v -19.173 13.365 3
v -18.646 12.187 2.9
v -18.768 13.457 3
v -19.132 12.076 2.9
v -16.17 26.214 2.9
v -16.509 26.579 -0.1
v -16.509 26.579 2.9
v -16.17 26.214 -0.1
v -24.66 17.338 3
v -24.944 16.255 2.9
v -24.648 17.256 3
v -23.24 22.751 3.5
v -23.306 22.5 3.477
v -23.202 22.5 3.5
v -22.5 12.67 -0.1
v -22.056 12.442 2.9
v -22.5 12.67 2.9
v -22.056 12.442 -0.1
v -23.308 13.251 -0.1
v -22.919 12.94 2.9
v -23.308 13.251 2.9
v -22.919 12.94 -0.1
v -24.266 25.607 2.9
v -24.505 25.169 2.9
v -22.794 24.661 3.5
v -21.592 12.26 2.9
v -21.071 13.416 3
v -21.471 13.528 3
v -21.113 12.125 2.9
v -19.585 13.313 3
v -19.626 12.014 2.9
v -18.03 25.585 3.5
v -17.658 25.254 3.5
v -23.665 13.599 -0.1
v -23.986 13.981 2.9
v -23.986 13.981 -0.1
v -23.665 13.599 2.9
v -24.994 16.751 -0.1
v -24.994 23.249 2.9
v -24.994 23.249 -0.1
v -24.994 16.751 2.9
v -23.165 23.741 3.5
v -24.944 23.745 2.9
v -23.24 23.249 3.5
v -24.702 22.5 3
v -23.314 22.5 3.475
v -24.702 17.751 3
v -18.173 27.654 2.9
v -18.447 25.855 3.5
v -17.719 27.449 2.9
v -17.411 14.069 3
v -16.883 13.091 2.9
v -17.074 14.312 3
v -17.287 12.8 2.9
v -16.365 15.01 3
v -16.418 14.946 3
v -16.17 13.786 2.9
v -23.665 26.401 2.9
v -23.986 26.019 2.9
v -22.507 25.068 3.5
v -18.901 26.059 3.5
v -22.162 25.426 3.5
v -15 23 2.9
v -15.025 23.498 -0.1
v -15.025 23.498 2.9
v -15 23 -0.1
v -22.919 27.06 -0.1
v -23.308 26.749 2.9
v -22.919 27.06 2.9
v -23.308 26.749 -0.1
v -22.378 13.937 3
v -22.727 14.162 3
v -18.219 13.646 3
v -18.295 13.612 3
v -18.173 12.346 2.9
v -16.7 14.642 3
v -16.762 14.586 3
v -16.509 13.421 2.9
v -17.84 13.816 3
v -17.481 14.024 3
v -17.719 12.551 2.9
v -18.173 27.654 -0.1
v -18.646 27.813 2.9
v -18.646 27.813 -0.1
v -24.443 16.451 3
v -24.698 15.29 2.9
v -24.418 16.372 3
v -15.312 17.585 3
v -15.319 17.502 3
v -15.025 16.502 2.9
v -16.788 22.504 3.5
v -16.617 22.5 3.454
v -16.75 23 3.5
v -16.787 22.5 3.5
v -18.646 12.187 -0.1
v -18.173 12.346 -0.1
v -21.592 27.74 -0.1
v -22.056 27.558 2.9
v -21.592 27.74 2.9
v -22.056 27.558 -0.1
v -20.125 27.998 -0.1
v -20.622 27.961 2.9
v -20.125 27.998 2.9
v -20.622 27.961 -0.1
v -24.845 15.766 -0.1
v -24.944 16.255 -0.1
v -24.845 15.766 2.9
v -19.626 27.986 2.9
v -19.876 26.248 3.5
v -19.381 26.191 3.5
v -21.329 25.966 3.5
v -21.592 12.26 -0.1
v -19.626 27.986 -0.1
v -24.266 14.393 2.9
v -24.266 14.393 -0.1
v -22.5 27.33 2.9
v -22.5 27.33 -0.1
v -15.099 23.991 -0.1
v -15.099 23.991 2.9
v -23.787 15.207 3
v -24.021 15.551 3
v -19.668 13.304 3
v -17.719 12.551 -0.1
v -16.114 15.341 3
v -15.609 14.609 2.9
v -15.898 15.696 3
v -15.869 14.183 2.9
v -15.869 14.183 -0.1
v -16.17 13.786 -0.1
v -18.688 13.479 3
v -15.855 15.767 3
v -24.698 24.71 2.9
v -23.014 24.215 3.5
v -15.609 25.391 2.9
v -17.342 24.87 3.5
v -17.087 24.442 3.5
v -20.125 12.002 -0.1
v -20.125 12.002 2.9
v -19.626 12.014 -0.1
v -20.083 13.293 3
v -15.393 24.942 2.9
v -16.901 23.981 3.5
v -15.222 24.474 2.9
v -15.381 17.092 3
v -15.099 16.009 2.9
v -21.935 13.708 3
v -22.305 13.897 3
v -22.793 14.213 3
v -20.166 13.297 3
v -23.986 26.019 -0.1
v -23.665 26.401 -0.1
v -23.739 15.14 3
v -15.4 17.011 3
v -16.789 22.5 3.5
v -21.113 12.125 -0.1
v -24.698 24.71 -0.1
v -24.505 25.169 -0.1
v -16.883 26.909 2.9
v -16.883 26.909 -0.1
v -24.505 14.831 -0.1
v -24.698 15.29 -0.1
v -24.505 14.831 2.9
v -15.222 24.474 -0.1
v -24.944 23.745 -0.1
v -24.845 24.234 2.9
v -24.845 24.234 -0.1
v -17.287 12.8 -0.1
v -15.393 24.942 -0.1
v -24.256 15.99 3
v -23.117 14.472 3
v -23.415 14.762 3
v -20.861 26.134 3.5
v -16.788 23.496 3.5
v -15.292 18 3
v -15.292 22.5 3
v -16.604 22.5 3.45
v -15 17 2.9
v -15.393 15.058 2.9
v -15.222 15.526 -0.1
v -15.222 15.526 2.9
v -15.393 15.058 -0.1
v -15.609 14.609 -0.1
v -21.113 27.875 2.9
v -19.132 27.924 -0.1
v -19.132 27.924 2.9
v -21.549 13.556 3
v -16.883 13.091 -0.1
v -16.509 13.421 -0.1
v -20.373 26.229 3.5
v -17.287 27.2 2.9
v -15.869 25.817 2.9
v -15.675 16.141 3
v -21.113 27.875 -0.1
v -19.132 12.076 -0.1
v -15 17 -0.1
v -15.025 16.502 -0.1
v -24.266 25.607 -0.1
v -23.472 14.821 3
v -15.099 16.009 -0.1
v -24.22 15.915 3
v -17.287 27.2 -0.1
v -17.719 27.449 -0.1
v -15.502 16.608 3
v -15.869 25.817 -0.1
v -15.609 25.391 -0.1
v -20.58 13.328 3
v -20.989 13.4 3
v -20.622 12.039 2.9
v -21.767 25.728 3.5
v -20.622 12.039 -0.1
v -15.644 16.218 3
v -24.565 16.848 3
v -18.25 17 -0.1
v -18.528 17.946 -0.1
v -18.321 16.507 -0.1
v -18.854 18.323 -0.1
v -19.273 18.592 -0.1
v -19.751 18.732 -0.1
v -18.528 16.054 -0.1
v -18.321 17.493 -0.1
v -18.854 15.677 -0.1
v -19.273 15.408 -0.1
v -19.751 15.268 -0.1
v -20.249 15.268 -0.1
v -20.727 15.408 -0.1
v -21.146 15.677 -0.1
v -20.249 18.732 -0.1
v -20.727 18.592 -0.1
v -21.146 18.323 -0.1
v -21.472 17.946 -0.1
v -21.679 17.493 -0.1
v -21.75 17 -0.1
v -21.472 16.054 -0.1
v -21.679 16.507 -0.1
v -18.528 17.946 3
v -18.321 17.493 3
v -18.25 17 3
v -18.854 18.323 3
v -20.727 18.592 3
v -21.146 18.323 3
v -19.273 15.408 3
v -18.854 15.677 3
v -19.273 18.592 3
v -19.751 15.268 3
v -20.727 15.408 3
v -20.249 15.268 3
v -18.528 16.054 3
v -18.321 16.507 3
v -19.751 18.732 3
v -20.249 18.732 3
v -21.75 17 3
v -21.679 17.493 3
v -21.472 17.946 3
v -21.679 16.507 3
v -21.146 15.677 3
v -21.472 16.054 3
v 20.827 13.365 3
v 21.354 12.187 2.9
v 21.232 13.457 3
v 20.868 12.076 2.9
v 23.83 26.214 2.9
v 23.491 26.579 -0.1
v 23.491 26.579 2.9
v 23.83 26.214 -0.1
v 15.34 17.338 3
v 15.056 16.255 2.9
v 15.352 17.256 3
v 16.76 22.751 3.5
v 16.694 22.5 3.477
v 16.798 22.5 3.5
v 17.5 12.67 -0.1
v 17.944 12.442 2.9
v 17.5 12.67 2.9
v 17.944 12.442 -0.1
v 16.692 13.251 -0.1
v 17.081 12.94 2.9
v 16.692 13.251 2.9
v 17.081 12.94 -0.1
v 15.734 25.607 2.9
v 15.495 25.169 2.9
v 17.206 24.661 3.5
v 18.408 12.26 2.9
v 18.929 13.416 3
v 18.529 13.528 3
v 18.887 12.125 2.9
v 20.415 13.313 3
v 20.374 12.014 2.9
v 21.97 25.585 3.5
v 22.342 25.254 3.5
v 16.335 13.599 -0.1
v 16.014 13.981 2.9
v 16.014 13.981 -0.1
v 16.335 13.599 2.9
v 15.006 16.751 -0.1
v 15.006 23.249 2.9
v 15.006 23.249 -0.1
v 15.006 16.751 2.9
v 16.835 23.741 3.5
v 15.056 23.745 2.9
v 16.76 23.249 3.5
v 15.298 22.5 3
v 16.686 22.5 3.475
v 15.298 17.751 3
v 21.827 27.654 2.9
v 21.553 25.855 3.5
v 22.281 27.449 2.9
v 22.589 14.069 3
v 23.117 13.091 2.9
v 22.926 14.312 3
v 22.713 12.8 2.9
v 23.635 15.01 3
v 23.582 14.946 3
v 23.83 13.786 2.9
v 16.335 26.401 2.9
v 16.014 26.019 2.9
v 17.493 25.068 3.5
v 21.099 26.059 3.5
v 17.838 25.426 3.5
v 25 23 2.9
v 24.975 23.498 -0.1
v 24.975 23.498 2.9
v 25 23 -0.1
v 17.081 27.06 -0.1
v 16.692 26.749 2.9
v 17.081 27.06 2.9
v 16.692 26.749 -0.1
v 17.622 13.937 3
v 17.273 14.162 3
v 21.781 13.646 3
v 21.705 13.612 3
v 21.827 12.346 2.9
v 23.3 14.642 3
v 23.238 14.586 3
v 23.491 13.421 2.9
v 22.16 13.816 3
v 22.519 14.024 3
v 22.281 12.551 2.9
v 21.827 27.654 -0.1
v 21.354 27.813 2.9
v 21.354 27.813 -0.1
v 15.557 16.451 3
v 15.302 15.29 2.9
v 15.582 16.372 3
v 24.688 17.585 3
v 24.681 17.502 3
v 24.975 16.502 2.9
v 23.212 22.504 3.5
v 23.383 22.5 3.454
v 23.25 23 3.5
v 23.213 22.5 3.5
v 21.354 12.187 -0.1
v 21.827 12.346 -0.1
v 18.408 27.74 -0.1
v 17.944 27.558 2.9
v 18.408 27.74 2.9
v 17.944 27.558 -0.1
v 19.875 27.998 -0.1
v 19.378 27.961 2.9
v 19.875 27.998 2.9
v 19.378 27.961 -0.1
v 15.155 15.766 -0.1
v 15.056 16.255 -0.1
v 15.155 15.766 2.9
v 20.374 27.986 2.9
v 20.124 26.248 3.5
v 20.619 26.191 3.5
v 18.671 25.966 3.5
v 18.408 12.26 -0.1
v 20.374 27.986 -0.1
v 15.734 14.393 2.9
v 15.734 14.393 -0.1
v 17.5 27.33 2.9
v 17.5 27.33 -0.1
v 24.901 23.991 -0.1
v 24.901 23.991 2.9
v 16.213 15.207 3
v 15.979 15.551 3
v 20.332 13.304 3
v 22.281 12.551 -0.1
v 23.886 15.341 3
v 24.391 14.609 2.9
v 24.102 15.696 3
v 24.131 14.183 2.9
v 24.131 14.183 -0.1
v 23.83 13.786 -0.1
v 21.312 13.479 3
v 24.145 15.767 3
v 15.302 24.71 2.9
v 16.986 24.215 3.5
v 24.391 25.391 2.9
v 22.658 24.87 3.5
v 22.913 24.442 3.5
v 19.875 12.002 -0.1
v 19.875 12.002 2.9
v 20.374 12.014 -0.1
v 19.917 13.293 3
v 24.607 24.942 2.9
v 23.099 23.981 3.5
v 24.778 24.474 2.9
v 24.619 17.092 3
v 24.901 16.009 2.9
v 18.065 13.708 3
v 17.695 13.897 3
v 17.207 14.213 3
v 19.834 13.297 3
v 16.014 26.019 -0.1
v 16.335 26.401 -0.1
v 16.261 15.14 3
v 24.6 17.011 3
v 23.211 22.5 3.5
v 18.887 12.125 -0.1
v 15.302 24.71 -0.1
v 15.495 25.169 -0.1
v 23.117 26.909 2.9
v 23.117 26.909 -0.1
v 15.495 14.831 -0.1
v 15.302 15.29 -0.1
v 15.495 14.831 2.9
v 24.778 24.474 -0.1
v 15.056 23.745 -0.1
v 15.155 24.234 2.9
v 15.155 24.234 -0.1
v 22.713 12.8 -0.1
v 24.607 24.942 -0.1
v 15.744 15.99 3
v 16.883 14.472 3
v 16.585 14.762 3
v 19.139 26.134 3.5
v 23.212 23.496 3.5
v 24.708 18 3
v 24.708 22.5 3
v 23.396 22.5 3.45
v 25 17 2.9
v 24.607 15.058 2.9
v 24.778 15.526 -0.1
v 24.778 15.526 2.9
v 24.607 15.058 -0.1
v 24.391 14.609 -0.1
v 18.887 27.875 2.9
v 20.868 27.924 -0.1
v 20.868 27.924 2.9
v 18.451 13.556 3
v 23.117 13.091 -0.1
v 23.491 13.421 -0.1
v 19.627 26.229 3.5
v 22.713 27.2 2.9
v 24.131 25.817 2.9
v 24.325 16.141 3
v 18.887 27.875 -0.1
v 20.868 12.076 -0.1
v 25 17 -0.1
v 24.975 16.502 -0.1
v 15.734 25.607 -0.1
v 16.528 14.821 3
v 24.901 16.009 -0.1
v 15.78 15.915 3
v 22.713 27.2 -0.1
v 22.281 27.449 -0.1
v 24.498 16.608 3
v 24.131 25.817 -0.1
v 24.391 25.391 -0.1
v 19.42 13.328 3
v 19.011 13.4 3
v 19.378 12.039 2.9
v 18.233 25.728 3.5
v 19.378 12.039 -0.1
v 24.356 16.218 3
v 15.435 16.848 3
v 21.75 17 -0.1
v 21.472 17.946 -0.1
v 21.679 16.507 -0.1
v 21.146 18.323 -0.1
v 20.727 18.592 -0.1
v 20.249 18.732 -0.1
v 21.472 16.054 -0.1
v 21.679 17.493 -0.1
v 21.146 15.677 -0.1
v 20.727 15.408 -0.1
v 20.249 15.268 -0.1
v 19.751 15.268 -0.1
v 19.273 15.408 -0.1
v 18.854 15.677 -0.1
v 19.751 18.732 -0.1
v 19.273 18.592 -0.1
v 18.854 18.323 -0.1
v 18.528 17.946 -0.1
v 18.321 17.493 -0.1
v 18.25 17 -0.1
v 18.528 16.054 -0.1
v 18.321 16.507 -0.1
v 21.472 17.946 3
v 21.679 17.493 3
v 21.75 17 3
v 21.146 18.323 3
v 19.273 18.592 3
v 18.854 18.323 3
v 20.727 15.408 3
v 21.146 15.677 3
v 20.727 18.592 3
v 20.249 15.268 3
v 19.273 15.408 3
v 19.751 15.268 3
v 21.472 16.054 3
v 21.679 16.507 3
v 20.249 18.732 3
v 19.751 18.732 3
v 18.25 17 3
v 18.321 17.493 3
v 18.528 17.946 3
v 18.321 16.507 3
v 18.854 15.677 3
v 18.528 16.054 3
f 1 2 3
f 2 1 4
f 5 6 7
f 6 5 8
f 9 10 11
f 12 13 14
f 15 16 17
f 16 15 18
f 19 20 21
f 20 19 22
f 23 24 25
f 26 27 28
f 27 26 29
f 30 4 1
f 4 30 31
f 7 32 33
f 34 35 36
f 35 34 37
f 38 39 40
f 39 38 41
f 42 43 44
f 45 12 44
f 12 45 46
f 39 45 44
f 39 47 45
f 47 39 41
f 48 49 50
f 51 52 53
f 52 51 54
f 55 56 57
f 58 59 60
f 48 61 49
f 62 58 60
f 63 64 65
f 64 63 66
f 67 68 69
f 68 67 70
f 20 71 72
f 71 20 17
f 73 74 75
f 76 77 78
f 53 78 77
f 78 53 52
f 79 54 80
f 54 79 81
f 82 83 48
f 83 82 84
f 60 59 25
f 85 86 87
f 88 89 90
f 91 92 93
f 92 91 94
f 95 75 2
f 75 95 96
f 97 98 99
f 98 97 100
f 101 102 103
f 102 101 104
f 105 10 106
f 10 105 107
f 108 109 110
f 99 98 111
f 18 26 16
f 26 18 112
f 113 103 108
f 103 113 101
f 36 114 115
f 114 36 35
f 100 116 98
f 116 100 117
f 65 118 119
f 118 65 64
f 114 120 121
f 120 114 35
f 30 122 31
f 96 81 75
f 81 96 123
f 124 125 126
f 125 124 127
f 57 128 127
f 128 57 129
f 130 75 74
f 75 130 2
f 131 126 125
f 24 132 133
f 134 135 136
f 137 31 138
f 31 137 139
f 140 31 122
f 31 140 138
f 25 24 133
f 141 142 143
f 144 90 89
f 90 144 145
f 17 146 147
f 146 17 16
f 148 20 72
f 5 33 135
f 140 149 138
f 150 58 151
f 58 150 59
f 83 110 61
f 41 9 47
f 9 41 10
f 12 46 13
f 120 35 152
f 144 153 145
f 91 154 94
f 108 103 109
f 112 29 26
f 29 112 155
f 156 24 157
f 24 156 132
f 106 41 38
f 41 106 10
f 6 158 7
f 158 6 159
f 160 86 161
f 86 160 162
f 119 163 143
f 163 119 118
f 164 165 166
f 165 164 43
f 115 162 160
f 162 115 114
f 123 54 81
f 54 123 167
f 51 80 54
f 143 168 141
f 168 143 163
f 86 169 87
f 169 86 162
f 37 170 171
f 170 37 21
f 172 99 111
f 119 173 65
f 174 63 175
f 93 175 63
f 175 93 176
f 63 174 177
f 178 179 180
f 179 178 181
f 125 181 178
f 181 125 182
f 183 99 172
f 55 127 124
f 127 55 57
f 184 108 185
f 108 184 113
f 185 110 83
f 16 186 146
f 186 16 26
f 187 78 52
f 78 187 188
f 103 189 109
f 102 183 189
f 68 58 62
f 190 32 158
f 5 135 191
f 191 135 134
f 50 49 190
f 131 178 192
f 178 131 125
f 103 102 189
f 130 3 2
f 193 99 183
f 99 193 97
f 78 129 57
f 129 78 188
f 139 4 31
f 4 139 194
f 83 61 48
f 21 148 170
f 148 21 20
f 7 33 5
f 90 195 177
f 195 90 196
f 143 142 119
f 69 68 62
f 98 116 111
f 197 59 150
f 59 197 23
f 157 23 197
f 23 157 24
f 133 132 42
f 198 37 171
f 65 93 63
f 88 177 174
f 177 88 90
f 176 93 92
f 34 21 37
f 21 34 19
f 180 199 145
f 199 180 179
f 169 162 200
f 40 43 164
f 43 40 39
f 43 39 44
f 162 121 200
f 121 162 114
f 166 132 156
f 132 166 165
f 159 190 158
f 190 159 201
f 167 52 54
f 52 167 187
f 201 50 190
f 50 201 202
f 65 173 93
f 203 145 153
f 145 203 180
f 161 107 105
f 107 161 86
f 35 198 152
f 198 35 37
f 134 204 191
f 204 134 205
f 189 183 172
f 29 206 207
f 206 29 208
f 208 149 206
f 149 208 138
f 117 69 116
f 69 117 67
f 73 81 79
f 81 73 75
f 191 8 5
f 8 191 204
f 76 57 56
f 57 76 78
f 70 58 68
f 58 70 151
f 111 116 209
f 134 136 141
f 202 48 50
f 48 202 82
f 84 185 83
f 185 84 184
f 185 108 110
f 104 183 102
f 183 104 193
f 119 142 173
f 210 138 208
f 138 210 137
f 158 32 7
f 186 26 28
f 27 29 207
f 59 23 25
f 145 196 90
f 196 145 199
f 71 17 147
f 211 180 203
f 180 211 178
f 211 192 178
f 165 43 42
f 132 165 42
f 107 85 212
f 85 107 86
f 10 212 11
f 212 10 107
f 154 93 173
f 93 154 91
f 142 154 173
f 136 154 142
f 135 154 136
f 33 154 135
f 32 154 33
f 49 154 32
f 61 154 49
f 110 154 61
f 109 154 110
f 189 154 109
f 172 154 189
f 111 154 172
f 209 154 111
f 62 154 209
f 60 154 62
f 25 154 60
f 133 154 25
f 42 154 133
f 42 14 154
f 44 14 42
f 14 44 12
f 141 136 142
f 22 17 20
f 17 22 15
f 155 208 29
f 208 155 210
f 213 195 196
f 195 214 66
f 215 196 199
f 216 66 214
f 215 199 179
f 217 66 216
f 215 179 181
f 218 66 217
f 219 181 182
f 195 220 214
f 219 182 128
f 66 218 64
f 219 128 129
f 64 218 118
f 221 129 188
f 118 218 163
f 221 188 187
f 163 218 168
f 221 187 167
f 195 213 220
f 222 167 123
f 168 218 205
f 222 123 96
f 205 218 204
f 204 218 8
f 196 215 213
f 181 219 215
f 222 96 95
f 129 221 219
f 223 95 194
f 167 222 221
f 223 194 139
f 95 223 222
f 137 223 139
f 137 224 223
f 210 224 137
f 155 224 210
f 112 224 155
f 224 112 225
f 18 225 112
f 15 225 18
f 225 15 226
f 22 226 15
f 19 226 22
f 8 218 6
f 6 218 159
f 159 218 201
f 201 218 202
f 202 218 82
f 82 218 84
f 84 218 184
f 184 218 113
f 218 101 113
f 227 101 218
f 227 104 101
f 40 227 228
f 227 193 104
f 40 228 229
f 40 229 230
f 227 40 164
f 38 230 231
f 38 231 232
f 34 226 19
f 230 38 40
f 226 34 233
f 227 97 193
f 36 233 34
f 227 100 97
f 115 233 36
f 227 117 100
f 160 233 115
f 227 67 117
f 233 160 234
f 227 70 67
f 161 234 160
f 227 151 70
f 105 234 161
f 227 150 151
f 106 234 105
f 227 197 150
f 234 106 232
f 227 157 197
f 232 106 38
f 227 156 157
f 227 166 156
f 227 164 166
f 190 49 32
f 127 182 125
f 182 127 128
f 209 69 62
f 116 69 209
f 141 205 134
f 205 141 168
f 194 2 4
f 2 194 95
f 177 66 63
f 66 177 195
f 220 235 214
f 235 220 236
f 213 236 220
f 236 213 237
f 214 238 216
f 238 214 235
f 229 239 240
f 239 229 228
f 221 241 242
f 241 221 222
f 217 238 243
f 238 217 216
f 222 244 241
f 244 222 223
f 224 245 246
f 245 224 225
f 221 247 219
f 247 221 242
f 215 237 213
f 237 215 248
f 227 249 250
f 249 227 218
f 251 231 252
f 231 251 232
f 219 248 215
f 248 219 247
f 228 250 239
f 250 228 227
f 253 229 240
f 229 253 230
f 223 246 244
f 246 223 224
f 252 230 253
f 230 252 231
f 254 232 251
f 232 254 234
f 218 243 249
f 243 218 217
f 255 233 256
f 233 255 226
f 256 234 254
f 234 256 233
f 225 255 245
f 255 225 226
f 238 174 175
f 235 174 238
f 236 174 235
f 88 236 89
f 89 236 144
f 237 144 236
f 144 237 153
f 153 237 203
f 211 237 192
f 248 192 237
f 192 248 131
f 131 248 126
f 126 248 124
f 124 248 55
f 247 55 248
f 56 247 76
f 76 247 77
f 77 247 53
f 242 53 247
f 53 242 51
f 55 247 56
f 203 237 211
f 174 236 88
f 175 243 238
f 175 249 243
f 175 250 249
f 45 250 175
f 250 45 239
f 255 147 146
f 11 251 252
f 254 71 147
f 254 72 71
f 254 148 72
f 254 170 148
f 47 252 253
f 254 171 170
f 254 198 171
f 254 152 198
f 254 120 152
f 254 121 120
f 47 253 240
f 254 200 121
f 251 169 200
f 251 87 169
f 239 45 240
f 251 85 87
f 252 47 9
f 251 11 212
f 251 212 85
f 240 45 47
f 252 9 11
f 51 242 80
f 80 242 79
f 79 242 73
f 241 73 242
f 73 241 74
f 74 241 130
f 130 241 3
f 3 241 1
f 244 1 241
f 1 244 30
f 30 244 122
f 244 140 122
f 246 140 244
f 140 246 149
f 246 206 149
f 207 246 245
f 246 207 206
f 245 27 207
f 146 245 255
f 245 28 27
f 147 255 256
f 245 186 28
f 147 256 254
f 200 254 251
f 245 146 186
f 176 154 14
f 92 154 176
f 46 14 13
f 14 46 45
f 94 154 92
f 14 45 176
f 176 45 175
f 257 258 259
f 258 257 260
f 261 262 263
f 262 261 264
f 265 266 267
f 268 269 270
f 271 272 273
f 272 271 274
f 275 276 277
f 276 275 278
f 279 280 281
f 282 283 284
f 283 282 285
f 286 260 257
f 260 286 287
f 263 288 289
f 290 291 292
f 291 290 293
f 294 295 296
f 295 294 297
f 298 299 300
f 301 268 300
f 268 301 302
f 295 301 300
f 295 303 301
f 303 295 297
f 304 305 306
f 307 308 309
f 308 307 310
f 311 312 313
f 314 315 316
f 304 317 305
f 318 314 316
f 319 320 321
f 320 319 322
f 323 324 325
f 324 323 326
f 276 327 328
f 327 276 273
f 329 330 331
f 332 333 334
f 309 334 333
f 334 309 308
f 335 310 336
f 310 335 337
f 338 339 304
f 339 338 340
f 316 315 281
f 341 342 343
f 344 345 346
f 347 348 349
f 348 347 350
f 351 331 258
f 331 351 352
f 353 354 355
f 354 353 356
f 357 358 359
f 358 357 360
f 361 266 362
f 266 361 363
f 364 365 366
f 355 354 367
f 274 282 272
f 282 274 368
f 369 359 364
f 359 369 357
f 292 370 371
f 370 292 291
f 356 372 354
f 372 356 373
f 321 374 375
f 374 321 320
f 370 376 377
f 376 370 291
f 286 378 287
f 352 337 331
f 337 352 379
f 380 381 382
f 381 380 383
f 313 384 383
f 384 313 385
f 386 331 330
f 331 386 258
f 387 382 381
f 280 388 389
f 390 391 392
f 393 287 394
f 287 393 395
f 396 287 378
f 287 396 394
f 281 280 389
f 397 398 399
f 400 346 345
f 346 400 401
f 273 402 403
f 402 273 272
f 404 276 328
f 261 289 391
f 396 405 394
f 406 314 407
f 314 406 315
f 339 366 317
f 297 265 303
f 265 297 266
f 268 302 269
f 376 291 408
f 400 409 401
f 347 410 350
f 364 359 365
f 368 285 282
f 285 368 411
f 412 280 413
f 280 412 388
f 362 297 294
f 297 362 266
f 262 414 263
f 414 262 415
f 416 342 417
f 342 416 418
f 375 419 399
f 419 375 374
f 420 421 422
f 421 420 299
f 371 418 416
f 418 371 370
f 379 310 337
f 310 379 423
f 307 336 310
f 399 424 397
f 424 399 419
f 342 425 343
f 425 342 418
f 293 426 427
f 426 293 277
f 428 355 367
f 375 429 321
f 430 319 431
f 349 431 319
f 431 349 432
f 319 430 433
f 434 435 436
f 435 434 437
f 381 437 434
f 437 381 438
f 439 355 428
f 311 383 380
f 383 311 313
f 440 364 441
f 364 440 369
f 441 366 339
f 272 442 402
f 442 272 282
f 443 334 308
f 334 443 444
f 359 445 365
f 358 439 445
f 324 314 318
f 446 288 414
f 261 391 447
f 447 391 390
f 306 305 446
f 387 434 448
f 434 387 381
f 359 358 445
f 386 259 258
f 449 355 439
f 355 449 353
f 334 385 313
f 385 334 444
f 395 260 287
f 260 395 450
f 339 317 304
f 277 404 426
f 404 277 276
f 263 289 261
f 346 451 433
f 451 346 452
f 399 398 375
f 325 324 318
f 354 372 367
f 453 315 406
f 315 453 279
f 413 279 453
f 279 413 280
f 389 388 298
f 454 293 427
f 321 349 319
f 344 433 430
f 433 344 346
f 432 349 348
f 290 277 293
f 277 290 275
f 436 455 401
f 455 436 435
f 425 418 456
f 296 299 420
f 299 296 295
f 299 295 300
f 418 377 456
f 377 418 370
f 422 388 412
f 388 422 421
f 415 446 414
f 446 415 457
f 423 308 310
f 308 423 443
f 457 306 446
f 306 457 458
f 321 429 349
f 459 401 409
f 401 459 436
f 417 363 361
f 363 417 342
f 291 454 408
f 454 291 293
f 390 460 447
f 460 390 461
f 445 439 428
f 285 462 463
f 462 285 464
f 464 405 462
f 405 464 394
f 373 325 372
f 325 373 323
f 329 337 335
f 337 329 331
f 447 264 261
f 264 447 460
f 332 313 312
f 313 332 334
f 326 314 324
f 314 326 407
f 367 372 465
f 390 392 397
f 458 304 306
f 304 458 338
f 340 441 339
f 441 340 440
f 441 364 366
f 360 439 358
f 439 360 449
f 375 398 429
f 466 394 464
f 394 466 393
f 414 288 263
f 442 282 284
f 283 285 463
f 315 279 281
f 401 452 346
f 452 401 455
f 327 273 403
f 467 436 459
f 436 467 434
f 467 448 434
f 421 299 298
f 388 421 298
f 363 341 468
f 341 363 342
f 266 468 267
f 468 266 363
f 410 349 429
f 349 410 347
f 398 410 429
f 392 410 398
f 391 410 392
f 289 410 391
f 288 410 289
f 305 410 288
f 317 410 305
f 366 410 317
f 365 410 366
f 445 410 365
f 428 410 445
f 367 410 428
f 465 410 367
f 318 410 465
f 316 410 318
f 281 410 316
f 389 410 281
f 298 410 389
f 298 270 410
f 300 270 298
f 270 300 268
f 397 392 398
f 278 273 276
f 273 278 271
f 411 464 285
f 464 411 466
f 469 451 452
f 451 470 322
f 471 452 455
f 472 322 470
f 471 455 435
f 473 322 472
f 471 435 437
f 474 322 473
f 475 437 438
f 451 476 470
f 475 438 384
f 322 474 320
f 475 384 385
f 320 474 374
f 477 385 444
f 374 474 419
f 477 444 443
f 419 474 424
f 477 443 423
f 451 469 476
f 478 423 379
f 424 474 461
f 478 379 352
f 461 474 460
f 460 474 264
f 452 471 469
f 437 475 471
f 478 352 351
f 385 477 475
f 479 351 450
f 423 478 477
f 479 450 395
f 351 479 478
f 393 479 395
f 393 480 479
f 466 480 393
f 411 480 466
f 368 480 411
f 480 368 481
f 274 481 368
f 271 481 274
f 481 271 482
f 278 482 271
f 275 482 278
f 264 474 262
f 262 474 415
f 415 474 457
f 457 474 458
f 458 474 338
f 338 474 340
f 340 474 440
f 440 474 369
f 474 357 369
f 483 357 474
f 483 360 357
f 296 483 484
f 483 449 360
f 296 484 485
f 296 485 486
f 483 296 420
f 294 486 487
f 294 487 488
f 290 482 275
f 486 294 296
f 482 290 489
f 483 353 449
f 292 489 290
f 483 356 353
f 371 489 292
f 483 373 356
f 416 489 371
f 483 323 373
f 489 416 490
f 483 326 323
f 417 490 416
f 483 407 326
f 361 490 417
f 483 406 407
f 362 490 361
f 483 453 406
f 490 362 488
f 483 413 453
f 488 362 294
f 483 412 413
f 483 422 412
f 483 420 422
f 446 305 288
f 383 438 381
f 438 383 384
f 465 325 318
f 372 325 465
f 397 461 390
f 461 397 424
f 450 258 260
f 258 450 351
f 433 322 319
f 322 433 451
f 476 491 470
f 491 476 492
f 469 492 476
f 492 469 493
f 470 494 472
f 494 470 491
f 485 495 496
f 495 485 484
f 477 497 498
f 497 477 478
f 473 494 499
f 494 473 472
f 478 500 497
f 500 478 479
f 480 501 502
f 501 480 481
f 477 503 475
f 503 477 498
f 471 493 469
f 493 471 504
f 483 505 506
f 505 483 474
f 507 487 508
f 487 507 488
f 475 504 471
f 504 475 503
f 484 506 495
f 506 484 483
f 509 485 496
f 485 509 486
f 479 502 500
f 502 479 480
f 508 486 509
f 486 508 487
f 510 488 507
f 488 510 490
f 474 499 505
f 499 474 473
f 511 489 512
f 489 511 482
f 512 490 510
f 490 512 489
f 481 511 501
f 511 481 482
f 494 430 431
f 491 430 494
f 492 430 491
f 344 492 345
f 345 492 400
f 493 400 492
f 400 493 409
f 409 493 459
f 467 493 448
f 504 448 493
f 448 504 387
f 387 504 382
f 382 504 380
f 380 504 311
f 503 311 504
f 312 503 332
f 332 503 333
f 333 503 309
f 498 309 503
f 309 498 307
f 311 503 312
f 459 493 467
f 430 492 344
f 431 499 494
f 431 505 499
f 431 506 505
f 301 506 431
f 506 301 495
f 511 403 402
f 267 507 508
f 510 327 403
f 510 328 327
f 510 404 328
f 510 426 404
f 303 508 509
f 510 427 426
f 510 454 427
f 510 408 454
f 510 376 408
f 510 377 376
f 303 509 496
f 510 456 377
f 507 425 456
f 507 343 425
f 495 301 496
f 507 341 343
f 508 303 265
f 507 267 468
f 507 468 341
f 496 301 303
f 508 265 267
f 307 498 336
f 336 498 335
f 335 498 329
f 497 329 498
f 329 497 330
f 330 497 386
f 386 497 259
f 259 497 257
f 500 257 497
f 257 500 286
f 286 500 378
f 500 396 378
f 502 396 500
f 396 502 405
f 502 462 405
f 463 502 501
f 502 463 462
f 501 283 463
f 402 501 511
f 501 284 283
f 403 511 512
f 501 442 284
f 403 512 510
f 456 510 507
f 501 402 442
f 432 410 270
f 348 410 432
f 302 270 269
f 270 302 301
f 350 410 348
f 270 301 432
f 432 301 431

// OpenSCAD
$fs = 0.5;
$fa = 0.5;

//---------------------------------------------------------------------------------------------------- 
// CloverPlus Bed Clamp by pbmax (mpeterson333/@/gmail.com)
//---------------------------------------------------------------------------------------------------- 
// This is designed to secure a glass plate of about 2mm thickness to the CloverPlus 3D printer.
//
//---------------------------------------------------------------------------------------------------- 

base_mount_hole_d = 4.4;
slot_length = 8;
outer_slot_d = base_mount_hole_d + 4;
outer_slot_depth = 4.1;

base_mount_thick = 3 + outer_slot_depth;
base_mount_hole_spacing = 28;
base_mount_length = base_mount_hole_spacing + 30;
base_mount_width = 20;

glass_thick = 2;
clamp_spacing = 48;
clamp_width_offset = 0;
clamp_d = 10;
clamp_screw_d = 3;

clamp_tab_length = 6;
clamp_tab_thick = 3;
clamp_tab_width = clamp_d;
clamp_tab_hole_d = 3.5;
clamp_tab_bump_thick = 0.5;

ff = 0.1;

// Bed mount
*difference()
{
  union()
  {
    // base shape with rounded corners
    hull()
    {
      for (i = [-1,1])
        for (j = [-1,1])
          translate([i*(base_mount_length/2-base_mount_width/4), j*base_mount_width/4, 0])
            cylinder(d=base_mount_width/2, h=base_mount_thick);
    }
  
    // clamp mounts
    for (i = [-1,1])
      translate([i*clamp_spacing/2, clamp_width_offset, base_mount_thick])
        cylinder(h=glass_thick, d=clamp_d);
  }

  for (i = [-1,1])
  {
    // Slots
    translate([i*base_mount_hole_spacing/2, 0, 0])
    {
      translate([0,0,base_mount_thick-outer_slot_depth+ff])
        mount_slot(outer_slot_d, outer_slot_depth+ff, slot_length);
      mount_slot(base_mount_hole_d, base_mount_thick+1, slot_length);
    }
    // clamp holes
    translate([i*clamp_spacing/2, clamp_width_offset, -0.5])
      cylinder(h=glass_thick+base_mount_thick+1, d=clamp_screw_d);
  }

}

// Clamp tabs
translate([0, base_mount_width, 0])
{
  for (i = [-1,1])
    translate([i*clamp_tab_width*2,0,0])
      difference()
      {
        // Clamp tab with bump to grip the glass better
        hull()
        {
          mount_slot(clamp_tab_width, clamp_tab_thick, clamp_tab_length);
          translate([0,clamp_tab_length*0.5,clamp_tab_thick])
            cylinder(h=clamp_tab_bump_thick, d=clamp_tab_width*0.65);
        }
        // Clamp tab screw hole
        translate([0,-clamp_tab_length/2,-0.5])
          cylinder(d=clamp_tab_hole_d, h=clamp_tab_thick+1);
        // Clamp mount should not interfere with clamp tab bump
        translate([-clamp_tab_width*0.5,-clamp_tab_length*0.5-clamp_tab_width+clamp_d*0.55,clamp_tab_thick])
          cube([clamp_tab_width, clamp_tab_width, clamp_tab_thick]);
      }
}

module mount_slot(hole_d, height, length)
{
  hull()
  {
    for (i = [-1,1])
    translate([0, i*length/2, -ff])
      cylinder(h=height, d=hole_d);
  }
}
